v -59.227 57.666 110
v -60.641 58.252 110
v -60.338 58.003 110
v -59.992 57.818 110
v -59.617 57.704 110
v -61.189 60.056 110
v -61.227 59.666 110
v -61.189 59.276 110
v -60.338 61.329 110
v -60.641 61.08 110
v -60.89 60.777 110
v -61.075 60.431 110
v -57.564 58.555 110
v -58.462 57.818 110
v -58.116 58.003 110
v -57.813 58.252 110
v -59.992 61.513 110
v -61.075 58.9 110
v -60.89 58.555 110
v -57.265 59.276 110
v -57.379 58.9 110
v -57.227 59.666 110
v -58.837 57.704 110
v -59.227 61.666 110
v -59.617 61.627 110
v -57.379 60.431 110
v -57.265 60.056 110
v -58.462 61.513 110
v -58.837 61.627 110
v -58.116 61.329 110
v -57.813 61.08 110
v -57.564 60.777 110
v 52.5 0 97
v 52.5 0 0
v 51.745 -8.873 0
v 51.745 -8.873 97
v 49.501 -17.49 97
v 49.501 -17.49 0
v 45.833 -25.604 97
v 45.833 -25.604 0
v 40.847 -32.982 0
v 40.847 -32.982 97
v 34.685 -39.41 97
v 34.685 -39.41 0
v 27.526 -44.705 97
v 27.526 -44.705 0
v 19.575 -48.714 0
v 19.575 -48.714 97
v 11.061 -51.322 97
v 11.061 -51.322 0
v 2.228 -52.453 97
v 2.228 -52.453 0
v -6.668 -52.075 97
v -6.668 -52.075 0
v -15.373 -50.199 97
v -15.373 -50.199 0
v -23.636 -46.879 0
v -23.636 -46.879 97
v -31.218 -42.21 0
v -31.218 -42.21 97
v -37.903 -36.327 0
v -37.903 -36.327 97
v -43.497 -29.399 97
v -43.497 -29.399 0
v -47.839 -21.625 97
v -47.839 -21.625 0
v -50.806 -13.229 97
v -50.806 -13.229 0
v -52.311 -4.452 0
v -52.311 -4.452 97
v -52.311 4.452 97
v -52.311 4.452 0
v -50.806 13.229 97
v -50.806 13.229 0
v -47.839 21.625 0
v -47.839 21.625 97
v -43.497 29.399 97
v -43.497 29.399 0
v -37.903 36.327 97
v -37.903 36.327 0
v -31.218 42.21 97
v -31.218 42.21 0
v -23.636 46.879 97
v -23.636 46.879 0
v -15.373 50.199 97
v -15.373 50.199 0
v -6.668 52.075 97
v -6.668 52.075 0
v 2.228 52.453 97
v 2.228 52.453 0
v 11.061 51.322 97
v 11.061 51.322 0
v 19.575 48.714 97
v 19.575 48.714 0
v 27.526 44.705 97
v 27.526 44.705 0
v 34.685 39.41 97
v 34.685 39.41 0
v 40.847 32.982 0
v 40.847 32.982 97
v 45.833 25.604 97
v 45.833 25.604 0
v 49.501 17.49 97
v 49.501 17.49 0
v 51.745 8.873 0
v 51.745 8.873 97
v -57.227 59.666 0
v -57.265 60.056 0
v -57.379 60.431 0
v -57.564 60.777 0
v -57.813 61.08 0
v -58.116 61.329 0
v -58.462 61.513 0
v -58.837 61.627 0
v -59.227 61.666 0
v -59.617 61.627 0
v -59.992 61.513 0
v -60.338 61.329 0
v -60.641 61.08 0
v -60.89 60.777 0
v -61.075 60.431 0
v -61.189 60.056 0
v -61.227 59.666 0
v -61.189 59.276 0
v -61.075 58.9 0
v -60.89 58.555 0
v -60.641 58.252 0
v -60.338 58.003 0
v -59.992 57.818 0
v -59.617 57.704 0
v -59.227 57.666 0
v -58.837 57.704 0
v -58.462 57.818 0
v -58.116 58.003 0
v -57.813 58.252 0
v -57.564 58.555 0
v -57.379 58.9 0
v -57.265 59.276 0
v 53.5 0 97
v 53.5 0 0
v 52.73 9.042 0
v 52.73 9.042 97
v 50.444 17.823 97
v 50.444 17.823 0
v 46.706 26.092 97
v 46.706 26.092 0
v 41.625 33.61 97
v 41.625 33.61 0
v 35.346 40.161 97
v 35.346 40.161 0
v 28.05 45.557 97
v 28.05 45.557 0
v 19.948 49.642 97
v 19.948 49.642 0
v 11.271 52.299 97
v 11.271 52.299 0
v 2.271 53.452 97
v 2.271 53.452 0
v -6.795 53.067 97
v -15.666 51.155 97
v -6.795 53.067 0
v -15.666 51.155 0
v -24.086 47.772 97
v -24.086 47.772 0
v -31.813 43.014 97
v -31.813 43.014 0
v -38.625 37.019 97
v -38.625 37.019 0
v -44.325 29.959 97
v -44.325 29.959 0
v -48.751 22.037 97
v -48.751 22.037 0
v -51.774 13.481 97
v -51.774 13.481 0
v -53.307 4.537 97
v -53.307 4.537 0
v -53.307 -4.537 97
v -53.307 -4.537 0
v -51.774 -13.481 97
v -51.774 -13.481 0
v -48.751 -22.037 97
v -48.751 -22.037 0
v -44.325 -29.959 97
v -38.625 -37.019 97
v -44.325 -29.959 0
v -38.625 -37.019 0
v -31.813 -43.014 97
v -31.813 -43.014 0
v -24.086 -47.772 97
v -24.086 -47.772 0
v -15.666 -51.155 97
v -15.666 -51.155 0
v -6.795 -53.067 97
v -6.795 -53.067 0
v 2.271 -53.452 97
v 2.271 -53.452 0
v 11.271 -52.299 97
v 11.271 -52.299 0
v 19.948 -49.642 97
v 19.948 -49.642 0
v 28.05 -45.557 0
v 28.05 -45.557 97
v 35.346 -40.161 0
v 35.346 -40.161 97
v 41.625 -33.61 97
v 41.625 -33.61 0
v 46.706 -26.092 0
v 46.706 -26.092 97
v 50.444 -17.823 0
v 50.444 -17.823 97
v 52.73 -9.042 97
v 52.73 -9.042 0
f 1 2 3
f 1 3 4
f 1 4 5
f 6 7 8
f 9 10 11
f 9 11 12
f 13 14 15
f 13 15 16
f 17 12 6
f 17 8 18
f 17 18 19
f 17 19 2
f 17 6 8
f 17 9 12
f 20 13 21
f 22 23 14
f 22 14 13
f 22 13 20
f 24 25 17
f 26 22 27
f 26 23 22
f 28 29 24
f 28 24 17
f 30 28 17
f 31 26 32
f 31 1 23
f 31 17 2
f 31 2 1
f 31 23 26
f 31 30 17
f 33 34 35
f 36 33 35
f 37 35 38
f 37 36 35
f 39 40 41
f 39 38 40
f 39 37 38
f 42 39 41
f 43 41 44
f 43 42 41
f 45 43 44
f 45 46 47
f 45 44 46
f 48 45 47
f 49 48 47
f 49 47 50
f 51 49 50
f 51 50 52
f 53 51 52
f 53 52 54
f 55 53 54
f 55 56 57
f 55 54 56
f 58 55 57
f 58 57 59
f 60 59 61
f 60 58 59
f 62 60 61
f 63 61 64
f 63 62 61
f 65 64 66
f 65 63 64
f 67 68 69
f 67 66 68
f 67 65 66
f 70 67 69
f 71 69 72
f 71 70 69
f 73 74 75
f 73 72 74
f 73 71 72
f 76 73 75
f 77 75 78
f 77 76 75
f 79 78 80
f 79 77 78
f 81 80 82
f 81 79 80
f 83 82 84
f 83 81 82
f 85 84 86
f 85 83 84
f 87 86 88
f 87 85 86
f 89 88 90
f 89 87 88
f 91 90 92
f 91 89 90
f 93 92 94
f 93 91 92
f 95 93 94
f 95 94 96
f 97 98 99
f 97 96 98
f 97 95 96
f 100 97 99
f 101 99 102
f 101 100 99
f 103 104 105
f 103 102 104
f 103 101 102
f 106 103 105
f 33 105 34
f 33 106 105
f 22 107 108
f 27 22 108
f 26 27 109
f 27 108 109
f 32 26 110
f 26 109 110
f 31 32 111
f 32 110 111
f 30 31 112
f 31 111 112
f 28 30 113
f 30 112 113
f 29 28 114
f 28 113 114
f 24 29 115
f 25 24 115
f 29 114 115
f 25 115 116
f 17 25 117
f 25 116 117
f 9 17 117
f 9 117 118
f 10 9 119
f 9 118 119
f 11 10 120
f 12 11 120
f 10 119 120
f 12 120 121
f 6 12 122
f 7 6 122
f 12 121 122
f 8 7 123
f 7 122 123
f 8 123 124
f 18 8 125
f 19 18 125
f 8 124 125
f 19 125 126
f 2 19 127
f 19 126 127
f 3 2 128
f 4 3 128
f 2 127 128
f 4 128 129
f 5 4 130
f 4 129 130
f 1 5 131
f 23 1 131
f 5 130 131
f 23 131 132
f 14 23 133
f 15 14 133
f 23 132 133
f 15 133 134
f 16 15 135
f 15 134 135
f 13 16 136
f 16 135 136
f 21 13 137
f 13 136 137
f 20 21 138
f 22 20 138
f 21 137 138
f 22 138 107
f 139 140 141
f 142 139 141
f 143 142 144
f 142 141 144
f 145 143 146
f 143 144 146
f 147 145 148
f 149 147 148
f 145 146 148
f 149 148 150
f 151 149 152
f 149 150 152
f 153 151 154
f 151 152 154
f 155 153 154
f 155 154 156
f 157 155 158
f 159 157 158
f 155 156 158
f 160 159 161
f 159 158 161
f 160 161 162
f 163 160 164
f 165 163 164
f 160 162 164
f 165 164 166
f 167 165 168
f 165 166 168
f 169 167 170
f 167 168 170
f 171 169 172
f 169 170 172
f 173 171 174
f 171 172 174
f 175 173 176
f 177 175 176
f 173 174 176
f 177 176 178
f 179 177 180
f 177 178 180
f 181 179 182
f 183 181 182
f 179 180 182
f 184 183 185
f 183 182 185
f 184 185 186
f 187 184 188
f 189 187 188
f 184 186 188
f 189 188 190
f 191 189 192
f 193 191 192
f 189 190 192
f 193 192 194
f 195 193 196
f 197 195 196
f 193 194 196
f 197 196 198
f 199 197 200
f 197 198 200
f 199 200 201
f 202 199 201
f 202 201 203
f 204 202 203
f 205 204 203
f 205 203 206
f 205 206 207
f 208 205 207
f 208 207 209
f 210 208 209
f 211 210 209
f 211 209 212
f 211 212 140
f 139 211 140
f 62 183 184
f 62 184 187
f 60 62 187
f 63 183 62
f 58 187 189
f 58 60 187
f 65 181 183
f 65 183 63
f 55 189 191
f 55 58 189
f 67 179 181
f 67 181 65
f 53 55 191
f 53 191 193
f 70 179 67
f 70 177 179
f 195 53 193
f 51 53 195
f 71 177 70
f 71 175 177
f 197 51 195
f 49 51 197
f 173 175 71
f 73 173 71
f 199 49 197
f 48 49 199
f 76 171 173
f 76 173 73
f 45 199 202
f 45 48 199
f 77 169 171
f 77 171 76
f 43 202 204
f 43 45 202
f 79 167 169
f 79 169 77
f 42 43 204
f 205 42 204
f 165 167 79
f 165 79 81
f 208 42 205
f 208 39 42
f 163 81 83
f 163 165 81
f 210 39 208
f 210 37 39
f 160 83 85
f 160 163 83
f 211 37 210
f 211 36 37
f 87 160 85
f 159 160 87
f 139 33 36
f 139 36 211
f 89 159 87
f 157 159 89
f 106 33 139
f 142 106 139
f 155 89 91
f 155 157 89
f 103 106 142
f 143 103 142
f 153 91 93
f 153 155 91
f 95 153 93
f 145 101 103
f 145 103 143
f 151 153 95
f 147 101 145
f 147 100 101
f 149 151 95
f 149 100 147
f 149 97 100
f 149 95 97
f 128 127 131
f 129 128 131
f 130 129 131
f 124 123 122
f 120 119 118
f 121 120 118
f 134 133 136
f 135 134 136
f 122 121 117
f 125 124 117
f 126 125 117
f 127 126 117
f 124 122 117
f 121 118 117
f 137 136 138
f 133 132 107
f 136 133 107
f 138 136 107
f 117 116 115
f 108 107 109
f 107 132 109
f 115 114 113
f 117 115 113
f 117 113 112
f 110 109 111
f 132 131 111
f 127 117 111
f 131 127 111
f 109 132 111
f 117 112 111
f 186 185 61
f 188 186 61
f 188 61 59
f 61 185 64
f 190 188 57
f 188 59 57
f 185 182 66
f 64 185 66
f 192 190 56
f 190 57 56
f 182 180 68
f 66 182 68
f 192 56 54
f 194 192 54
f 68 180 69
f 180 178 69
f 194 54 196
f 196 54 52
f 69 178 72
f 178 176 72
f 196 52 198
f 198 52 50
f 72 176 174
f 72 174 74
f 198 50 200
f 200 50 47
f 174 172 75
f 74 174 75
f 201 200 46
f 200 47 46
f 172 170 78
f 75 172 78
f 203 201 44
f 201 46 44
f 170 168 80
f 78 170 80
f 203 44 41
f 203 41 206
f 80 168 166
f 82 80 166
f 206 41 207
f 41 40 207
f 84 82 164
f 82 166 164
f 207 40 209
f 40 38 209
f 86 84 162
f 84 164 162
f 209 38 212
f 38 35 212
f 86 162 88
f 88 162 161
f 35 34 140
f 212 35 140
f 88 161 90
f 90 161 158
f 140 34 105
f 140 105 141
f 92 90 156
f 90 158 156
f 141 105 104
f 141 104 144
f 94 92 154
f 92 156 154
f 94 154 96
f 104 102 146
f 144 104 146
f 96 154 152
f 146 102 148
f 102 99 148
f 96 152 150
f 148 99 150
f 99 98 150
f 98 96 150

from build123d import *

# Parameters (mm, degrees)
F0_R     = 53.5
F1_DEPTH = 97
F2_T     = -1
F3_DEPTH = 1.001
F4_R     = 2
F5_DEPTH = 110


with BuildPart() as f1:
    # F0 (on Top) → F1 (new body)
    with BuildSketch(Plane.XY):
        Circle(F0_R)
    extrude(amount=F1_DEPTH)

    # F2
    f2_openings = [f1.faces().sort_by_distance(p)[0] for p in [
        (0, 0, 97),
    ]]
    offset(amount=F2_T, openings=f2_openings)

    # F3 (cut, through all): a face of the model
    f3_faces = [f1.faces().sort_by_distance(p)[0] for p in [
        (0, 0, 1),
    ]]
    extrude(f3_faces, amount=-F3_DEPTH, mode=Mode.SUBTRACT)


with BuildPart() as f5:
    # F4 (on Top) → F5 (new body)
    with BuildSketch(Plane.XY):
        with Locations((-59.2270195484, 59.6657395363)):
            Circle(F4_R)
    extrude(amount=F5_DEPTH)


solid = Compound([f1.part, f5.part])
